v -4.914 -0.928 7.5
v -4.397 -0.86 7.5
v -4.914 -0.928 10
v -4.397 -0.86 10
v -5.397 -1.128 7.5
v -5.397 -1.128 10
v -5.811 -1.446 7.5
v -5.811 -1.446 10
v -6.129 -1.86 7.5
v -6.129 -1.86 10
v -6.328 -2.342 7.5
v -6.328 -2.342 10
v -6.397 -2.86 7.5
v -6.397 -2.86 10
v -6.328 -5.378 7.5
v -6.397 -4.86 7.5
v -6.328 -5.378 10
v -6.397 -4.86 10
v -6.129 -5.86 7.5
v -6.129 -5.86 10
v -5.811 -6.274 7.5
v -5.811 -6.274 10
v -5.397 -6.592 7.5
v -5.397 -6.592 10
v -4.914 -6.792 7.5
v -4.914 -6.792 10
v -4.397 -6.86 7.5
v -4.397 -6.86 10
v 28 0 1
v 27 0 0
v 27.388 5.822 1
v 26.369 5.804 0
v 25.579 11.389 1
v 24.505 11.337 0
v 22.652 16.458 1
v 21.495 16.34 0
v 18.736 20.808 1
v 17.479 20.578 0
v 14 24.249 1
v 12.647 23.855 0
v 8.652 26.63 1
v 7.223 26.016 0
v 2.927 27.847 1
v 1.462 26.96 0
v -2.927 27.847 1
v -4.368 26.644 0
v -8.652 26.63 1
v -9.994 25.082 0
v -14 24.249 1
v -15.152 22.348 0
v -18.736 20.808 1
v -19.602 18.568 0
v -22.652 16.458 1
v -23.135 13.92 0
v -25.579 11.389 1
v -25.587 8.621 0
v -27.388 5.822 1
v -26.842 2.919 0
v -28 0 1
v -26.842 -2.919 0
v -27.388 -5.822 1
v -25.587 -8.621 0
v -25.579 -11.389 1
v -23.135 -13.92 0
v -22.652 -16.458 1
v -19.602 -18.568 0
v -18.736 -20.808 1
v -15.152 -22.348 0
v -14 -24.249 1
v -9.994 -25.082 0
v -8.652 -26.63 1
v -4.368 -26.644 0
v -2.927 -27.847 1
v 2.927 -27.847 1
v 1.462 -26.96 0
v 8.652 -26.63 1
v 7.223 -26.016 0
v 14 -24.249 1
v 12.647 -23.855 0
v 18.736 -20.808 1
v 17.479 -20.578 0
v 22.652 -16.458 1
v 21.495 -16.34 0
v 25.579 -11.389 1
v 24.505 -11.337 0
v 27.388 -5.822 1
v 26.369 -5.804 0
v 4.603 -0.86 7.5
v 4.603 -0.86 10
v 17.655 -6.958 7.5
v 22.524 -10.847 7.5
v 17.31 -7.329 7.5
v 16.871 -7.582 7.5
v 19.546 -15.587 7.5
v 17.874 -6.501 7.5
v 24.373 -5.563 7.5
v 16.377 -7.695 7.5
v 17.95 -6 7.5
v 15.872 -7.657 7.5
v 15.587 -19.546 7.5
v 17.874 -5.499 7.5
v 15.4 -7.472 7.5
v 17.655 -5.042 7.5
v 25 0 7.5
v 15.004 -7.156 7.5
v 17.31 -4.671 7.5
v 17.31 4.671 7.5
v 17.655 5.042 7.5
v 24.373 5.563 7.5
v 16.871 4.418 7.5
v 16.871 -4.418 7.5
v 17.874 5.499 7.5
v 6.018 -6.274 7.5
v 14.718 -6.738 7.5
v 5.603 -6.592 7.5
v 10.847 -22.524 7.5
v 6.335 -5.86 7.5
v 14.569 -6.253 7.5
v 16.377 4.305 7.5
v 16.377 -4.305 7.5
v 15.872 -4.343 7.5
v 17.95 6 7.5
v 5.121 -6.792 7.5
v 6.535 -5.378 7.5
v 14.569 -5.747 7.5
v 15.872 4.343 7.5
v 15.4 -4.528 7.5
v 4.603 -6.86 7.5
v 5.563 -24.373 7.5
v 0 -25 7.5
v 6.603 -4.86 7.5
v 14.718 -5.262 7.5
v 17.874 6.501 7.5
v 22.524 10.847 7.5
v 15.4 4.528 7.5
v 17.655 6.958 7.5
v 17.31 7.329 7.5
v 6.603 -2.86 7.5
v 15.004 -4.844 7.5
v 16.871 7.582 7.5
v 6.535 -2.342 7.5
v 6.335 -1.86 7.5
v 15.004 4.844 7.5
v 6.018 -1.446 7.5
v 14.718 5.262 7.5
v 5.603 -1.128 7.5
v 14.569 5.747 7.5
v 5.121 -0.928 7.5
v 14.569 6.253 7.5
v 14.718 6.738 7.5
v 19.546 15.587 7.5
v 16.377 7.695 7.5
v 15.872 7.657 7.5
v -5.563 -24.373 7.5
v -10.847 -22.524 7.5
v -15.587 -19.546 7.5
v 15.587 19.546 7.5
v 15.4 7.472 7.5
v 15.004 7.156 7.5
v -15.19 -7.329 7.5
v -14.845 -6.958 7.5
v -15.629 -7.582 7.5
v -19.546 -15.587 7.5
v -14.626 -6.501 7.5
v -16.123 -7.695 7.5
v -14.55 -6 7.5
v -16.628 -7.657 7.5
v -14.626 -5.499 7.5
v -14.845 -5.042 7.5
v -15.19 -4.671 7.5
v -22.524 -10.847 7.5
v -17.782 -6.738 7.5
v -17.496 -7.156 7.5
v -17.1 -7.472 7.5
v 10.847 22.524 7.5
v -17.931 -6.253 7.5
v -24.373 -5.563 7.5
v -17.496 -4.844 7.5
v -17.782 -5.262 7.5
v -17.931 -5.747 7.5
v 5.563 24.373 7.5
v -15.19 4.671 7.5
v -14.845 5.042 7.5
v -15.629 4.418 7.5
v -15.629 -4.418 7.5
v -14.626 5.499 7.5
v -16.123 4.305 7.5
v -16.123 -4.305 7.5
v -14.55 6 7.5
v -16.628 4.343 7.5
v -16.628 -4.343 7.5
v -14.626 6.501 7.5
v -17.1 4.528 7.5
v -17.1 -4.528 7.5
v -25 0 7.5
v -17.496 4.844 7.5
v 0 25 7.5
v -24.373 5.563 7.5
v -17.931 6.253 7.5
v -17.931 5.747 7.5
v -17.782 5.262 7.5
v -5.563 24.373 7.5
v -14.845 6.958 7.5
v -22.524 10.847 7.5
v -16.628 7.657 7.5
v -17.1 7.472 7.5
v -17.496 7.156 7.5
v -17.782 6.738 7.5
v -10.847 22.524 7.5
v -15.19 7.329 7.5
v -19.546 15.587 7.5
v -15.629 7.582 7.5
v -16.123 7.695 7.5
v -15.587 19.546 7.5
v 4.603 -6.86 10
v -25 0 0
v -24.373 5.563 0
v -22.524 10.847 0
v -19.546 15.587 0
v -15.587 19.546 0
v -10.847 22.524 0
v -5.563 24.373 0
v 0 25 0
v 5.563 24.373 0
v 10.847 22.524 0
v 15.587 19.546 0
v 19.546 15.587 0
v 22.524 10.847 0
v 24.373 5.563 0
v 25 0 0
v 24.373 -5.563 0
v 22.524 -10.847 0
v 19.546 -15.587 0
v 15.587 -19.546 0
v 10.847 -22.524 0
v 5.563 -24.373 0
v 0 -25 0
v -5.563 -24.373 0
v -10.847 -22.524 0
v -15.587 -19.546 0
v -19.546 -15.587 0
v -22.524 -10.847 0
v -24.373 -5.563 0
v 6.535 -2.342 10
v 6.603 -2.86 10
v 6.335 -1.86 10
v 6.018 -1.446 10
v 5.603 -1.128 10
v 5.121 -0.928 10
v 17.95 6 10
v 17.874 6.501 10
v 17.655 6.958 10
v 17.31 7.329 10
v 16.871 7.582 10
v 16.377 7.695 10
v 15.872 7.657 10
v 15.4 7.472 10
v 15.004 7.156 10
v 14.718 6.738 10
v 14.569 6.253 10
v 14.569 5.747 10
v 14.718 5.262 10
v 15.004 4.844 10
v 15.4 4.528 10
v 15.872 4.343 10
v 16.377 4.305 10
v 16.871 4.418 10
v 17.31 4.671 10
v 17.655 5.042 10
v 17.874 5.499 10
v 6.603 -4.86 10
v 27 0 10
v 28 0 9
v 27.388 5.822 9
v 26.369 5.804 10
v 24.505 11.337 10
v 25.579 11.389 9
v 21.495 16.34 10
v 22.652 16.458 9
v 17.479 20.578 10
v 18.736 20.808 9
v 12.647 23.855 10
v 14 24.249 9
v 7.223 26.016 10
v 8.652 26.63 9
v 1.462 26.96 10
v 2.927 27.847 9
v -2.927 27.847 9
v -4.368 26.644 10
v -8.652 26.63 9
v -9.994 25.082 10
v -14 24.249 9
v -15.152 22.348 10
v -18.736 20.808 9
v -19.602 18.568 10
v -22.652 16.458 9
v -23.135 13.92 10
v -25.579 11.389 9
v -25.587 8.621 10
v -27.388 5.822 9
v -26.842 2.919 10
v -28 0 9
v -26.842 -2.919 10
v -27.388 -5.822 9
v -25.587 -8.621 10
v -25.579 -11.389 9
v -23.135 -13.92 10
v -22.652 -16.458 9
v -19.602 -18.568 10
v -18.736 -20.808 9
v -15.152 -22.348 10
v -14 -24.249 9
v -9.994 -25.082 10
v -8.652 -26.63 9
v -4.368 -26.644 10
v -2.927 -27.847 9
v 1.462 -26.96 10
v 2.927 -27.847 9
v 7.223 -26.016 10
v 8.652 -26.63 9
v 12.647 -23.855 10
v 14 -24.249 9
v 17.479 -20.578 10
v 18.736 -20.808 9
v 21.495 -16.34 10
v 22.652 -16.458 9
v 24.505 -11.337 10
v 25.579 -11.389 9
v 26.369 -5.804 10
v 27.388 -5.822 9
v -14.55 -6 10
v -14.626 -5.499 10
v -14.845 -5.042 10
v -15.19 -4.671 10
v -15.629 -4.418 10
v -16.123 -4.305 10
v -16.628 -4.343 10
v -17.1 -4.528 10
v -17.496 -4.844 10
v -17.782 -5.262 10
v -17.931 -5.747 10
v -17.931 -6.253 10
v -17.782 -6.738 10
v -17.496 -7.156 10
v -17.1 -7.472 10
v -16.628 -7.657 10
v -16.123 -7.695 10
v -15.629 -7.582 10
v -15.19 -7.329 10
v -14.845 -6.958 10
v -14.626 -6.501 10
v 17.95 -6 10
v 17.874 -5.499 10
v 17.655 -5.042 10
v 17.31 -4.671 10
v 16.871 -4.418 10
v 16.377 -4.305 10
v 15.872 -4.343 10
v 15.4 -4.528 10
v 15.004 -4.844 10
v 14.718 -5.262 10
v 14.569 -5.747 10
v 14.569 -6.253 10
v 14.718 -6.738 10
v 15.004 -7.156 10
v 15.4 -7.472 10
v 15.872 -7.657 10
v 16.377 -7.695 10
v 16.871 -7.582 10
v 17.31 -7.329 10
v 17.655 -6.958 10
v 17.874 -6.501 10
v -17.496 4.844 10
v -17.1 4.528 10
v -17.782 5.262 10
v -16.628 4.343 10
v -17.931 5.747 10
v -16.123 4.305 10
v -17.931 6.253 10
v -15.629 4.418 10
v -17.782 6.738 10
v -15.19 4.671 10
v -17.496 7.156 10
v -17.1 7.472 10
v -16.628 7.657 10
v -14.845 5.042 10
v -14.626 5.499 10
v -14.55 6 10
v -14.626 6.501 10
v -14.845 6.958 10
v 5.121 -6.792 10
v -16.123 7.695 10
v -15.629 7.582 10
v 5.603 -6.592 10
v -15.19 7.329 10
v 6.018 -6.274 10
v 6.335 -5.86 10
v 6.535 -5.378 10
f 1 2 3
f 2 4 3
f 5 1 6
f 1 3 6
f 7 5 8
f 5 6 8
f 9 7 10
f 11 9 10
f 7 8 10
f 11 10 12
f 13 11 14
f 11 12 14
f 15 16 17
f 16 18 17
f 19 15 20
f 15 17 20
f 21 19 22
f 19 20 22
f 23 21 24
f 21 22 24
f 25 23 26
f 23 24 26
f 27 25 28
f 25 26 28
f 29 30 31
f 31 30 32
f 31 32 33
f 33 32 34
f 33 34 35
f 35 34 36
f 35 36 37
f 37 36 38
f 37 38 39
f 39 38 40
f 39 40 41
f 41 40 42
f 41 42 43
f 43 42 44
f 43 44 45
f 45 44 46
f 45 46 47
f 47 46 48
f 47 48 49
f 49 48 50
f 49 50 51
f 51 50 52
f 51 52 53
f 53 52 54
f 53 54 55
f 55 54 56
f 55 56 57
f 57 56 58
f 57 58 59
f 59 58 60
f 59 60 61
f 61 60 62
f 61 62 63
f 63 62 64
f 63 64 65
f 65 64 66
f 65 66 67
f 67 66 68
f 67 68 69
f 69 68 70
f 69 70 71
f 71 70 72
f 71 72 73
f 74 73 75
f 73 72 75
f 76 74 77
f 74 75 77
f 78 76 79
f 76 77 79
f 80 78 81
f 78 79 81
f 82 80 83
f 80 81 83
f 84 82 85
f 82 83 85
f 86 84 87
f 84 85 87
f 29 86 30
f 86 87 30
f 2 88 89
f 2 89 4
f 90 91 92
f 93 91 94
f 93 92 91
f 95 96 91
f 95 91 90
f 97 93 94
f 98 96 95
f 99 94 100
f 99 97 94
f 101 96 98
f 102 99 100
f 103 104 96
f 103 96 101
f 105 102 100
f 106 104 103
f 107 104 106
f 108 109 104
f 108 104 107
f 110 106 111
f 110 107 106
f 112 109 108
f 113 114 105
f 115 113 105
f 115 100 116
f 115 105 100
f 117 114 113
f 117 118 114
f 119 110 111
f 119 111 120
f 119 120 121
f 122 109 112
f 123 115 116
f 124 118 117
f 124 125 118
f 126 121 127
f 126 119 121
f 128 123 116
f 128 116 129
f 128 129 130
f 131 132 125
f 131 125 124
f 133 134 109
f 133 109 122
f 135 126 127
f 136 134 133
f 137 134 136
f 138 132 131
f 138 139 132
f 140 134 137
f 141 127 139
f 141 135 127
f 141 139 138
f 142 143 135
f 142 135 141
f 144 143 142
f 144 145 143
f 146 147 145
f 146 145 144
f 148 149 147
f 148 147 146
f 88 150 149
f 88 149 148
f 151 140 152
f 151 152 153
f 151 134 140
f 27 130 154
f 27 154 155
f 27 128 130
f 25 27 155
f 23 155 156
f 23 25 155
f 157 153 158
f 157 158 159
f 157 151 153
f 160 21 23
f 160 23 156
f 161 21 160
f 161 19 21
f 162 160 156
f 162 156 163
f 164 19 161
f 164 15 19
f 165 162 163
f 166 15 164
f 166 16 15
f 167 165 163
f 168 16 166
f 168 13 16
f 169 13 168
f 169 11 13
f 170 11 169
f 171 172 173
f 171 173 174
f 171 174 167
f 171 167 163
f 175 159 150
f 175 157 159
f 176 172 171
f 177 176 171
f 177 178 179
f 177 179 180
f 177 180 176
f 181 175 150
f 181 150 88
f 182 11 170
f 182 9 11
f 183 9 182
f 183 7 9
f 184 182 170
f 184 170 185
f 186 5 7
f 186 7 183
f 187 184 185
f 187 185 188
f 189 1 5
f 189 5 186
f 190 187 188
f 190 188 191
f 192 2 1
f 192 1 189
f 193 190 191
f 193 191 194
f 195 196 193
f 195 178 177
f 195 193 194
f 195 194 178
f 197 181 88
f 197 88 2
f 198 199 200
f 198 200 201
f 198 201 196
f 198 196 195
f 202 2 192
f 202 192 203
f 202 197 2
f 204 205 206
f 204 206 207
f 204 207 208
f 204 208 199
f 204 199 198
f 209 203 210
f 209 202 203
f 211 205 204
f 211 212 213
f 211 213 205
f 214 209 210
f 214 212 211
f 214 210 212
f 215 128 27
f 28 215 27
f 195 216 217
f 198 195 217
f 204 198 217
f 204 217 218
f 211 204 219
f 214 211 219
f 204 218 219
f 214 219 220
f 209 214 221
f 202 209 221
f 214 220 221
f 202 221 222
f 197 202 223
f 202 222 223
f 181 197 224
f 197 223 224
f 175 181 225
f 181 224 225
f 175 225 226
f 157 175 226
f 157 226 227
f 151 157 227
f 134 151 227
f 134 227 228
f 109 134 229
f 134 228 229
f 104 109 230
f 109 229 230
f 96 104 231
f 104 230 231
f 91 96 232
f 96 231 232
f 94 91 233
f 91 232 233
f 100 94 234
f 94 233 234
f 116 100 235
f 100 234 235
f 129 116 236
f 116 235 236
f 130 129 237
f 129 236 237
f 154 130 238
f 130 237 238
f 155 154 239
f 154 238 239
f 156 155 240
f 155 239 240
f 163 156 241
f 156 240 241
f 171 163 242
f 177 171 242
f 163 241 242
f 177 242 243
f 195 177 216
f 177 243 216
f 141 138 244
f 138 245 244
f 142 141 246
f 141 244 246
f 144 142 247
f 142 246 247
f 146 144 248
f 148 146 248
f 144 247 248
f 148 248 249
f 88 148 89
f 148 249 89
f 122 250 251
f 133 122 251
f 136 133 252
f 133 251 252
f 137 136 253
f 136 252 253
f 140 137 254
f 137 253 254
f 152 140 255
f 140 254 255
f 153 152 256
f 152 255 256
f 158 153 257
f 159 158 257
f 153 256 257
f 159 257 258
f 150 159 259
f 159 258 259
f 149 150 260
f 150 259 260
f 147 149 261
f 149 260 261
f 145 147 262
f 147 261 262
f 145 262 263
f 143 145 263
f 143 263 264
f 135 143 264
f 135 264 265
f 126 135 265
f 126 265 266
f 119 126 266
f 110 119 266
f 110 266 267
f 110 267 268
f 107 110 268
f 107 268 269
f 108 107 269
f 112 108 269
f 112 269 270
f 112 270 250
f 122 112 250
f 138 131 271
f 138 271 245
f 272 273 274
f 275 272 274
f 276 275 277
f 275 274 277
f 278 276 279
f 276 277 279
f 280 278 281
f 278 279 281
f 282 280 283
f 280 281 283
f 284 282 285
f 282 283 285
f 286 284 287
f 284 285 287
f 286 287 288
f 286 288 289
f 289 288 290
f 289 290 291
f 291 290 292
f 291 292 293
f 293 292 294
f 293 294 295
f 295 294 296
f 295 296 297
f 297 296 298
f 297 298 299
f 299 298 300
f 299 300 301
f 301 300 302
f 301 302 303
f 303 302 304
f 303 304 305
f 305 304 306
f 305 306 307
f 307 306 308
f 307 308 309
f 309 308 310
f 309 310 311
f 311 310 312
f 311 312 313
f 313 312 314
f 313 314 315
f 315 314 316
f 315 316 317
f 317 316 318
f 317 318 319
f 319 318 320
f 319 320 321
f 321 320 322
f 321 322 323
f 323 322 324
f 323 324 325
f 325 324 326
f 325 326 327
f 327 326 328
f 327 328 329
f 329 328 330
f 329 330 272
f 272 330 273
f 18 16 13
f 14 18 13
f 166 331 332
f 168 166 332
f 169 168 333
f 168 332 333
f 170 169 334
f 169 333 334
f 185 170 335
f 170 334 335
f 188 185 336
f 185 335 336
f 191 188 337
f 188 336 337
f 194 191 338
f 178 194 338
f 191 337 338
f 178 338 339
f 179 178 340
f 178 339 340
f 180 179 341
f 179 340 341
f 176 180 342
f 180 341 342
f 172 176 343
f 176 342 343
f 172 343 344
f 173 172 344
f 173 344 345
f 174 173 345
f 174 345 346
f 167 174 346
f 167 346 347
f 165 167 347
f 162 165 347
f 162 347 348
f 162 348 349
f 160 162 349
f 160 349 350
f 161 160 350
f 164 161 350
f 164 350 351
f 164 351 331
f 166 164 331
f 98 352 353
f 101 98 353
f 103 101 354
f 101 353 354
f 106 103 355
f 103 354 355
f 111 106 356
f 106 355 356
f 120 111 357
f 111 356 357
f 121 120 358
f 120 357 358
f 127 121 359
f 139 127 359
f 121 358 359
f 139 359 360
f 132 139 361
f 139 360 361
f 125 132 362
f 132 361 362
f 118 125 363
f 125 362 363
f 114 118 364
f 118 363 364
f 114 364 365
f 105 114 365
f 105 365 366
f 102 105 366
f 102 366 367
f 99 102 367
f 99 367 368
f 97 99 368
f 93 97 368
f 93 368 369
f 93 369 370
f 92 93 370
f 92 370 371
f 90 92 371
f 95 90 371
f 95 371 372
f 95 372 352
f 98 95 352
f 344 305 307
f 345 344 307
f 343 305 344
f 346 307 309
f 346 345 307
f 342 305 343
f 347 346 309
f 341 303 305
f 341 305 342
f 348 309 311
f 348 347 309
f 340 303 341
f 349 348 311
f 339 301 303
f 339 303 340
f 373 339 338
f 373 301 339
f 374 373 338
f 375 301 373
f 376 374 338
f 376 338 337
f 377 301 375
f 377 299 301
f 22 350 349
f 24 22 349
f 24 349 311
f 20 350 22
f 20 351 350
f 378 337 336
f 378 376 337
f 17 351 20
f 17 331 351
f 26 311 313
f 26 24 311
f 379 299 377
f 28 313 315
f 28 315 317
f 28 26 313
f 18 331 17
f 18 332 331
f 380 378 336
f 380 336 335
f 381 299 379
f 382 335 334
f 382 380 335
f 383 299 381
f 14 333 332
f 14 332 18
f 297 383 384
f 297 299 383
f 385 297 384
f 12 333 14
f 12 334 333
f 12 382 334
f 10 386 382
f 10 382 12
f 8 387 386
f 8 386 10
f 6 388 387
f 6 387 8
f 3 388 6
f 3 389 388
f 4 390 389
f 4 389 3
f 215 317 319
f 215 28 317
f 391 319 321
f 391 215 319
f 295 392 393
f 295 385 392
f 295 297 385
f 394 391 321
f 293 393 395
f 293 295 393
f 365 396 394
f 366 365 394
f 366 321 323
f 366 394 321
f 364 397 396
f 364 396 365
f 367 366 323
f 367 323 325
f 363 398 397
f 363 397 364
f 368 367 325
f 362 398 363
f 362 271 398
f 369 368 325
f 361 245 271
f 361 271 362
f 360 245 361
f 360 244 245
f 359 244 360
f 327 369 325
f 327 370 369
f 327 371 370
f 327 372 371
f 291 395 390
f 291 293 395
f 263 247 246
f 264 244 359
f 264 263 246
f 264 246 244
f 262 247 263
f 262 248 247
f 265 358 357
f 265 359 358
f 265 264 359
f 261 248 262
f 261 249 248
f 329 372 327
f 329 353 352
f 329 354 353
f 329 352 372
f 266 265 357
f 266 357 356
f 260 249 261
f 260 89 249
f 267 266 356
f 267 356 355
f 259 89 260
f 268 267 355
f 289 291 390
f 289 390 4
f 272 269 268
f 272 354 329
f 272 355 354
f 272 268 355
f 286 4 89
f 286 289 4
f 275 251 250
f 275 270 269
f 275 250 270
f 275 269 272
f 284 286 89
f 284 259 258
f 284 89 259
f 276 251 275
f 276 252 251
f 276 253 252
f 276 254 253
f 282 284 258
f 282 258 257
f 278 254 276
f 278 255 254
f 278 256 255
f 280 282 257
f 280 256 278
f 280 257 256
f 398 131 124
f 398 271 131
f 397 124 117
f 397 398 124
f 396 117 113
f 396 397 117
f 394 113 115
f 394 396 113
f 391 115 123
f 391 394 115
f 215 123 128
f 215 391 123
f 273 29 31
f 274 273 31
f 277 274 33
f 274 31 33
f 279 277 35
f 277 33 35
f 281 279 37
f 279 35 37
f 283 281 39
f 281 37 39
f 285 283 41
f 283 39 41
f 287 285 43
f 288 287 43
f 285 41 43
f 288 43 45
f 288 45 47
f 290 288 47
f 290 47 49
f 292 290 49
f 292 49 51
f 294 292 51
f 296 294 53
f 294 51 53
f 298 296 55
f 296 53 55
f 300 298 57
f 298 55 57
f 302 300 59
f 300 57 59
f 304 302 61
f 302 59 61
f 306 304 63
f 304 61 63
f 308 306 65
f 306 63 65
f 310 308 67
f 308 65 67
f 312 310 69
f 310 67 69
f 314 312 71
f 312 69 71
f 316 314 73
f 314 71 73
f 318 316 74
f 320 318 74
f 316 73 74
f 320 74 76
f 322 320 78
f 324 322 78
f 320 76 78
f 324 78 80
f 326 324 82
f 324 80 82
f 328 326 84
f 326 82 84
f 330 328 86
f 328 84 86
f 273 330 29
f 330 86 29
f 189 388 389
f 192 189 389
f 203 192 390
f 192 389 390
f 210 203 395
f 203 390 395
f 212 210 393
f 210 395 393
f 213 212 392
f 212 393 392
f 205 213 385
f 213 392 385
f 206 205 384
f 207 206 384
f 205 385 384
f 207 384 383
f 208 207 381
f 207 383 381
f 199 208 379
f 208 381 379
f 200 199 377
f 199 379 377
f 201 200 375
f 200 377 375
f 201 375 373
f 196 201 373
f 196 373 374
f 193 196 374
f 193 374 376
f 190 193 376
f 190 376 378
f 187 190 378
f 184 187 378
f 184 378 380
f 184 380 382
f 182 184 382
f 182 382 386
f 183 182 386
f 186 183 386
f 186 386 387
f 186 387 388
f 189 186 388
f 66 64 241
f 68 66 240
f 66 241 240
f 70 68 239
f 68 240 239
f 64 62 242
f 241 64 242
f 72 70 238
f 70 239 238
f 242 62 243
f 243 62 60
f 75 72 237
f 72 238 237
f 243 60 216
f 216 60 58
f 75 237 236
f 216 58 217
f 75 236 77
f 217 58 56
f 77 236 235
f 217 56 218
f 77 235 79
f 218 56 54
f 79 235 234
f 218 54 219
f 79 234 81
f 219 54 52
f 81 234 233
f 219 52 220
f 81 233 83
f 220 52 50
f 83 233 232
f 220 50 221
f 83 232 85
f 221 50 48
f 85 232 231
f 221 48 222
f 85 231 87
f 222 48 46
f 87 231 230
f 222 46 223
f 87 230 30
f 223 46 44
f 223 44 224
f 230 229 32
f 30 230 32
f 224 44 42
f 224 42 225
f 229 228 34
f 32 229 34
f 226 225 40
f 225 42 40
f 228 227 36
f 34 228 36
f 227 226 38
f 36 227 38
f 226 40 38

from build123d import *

# Parameters (mm, degrees)
SKETCH_1_R          = 28
EXTRUDE_1_DEPTH     = 10
SKETCH_3_R          = 25
CUT_EXTRUDE_2_DEPTH = 7.5
CUT_EXTRUDE_4_REACH = 42.302
SKETCH_6_W          = 13
SKETCH_6_H          = 6
FILLET_3_R          = 2
HOLE_WIZARD_M31_D   = 3.4
CHAMFER_1_SIZE      = 1


with BuildPart() as part:
    # Эскиз1 → Бобышка-Вытянуть1 (new body)
    with BuildSketch(Plane.XY):
        Circle(SKETCH_1_R)
    extrude(amount=EXTRUDE_1_DEPTH)

    # Эскиз3 → Вырез-Вытянуть2 (cut)
    with BuildSketch(Plane(origin=(0, 0, 0), x_dir=(-1, 0, 0), z_dir=(0, 0, -1))):
        Circle(SKETCH_3_R)
    extrude(amount=-CUT_EXTRUDE_2_DEPTH, mode=Mode.SUBTRACT)

    # Эскиз6 → Вырез-Вытянуть4 (cut, up to next)
    with BuildSketch(Plane(origin=(0, 0, 7.5), x_dir=(-1, 0, 0), z_dir=(0, 0, -1)), mode=Mode.PRIVATE) as cut_extrude_4_sk1:
        with Locations((-0.103380177, -3.86)):
            Rectangle(SKETCH_6_W, SKETCH_6_H)
    cut_extrude_4_tool1 = extrude(cut_extrude_4_sk1.sketch, amount=-CUT_EXTRUDE_4_REACH, mode=Mode.PRIVATE) & part.part
    add(cut_extrude_4_tool1.solids().sort_by_distance((0.10338, -3.86, 7.5))[0], mode=Mode.SUBTRACT)

    # Скругление3
    fillet_3_edges = [part.edges().sort_by_distance(p)[0] for p in [
        (-6.396619823, -0.86, 8.75),
        (-6.396619823, -6.86, 8.75),
        (6.603380177, -6.86, 8.75),
        (6.603380177, -0.86, 8.75),
    ]]
    fillet(fillet_3_edges, radius=FILLET_3_R)

    # Отверстие с зазором M31 (through all)
    with Locations(Plane(origin=(0, 0, 7.5), x_dir=(-1, 0, 0), z_dir=(0, 0, -1))):
        with Locations((16.25, -6), (16.25, 6), (-16.25, 6), (-16.25, -6)):
            Hole(HOLE_WIZARD_M31_D / 2)

    # Фаска1
    chamfer_1_edges = [part.edges().sort_by_distance(p)[0] for p in [
        (-28, 0, 0),
        (-28, 0, 10),
    ]]
    chamfer(chamfer_1_edges, length=CHAMFER_1_SIZE)


solid = part.part
